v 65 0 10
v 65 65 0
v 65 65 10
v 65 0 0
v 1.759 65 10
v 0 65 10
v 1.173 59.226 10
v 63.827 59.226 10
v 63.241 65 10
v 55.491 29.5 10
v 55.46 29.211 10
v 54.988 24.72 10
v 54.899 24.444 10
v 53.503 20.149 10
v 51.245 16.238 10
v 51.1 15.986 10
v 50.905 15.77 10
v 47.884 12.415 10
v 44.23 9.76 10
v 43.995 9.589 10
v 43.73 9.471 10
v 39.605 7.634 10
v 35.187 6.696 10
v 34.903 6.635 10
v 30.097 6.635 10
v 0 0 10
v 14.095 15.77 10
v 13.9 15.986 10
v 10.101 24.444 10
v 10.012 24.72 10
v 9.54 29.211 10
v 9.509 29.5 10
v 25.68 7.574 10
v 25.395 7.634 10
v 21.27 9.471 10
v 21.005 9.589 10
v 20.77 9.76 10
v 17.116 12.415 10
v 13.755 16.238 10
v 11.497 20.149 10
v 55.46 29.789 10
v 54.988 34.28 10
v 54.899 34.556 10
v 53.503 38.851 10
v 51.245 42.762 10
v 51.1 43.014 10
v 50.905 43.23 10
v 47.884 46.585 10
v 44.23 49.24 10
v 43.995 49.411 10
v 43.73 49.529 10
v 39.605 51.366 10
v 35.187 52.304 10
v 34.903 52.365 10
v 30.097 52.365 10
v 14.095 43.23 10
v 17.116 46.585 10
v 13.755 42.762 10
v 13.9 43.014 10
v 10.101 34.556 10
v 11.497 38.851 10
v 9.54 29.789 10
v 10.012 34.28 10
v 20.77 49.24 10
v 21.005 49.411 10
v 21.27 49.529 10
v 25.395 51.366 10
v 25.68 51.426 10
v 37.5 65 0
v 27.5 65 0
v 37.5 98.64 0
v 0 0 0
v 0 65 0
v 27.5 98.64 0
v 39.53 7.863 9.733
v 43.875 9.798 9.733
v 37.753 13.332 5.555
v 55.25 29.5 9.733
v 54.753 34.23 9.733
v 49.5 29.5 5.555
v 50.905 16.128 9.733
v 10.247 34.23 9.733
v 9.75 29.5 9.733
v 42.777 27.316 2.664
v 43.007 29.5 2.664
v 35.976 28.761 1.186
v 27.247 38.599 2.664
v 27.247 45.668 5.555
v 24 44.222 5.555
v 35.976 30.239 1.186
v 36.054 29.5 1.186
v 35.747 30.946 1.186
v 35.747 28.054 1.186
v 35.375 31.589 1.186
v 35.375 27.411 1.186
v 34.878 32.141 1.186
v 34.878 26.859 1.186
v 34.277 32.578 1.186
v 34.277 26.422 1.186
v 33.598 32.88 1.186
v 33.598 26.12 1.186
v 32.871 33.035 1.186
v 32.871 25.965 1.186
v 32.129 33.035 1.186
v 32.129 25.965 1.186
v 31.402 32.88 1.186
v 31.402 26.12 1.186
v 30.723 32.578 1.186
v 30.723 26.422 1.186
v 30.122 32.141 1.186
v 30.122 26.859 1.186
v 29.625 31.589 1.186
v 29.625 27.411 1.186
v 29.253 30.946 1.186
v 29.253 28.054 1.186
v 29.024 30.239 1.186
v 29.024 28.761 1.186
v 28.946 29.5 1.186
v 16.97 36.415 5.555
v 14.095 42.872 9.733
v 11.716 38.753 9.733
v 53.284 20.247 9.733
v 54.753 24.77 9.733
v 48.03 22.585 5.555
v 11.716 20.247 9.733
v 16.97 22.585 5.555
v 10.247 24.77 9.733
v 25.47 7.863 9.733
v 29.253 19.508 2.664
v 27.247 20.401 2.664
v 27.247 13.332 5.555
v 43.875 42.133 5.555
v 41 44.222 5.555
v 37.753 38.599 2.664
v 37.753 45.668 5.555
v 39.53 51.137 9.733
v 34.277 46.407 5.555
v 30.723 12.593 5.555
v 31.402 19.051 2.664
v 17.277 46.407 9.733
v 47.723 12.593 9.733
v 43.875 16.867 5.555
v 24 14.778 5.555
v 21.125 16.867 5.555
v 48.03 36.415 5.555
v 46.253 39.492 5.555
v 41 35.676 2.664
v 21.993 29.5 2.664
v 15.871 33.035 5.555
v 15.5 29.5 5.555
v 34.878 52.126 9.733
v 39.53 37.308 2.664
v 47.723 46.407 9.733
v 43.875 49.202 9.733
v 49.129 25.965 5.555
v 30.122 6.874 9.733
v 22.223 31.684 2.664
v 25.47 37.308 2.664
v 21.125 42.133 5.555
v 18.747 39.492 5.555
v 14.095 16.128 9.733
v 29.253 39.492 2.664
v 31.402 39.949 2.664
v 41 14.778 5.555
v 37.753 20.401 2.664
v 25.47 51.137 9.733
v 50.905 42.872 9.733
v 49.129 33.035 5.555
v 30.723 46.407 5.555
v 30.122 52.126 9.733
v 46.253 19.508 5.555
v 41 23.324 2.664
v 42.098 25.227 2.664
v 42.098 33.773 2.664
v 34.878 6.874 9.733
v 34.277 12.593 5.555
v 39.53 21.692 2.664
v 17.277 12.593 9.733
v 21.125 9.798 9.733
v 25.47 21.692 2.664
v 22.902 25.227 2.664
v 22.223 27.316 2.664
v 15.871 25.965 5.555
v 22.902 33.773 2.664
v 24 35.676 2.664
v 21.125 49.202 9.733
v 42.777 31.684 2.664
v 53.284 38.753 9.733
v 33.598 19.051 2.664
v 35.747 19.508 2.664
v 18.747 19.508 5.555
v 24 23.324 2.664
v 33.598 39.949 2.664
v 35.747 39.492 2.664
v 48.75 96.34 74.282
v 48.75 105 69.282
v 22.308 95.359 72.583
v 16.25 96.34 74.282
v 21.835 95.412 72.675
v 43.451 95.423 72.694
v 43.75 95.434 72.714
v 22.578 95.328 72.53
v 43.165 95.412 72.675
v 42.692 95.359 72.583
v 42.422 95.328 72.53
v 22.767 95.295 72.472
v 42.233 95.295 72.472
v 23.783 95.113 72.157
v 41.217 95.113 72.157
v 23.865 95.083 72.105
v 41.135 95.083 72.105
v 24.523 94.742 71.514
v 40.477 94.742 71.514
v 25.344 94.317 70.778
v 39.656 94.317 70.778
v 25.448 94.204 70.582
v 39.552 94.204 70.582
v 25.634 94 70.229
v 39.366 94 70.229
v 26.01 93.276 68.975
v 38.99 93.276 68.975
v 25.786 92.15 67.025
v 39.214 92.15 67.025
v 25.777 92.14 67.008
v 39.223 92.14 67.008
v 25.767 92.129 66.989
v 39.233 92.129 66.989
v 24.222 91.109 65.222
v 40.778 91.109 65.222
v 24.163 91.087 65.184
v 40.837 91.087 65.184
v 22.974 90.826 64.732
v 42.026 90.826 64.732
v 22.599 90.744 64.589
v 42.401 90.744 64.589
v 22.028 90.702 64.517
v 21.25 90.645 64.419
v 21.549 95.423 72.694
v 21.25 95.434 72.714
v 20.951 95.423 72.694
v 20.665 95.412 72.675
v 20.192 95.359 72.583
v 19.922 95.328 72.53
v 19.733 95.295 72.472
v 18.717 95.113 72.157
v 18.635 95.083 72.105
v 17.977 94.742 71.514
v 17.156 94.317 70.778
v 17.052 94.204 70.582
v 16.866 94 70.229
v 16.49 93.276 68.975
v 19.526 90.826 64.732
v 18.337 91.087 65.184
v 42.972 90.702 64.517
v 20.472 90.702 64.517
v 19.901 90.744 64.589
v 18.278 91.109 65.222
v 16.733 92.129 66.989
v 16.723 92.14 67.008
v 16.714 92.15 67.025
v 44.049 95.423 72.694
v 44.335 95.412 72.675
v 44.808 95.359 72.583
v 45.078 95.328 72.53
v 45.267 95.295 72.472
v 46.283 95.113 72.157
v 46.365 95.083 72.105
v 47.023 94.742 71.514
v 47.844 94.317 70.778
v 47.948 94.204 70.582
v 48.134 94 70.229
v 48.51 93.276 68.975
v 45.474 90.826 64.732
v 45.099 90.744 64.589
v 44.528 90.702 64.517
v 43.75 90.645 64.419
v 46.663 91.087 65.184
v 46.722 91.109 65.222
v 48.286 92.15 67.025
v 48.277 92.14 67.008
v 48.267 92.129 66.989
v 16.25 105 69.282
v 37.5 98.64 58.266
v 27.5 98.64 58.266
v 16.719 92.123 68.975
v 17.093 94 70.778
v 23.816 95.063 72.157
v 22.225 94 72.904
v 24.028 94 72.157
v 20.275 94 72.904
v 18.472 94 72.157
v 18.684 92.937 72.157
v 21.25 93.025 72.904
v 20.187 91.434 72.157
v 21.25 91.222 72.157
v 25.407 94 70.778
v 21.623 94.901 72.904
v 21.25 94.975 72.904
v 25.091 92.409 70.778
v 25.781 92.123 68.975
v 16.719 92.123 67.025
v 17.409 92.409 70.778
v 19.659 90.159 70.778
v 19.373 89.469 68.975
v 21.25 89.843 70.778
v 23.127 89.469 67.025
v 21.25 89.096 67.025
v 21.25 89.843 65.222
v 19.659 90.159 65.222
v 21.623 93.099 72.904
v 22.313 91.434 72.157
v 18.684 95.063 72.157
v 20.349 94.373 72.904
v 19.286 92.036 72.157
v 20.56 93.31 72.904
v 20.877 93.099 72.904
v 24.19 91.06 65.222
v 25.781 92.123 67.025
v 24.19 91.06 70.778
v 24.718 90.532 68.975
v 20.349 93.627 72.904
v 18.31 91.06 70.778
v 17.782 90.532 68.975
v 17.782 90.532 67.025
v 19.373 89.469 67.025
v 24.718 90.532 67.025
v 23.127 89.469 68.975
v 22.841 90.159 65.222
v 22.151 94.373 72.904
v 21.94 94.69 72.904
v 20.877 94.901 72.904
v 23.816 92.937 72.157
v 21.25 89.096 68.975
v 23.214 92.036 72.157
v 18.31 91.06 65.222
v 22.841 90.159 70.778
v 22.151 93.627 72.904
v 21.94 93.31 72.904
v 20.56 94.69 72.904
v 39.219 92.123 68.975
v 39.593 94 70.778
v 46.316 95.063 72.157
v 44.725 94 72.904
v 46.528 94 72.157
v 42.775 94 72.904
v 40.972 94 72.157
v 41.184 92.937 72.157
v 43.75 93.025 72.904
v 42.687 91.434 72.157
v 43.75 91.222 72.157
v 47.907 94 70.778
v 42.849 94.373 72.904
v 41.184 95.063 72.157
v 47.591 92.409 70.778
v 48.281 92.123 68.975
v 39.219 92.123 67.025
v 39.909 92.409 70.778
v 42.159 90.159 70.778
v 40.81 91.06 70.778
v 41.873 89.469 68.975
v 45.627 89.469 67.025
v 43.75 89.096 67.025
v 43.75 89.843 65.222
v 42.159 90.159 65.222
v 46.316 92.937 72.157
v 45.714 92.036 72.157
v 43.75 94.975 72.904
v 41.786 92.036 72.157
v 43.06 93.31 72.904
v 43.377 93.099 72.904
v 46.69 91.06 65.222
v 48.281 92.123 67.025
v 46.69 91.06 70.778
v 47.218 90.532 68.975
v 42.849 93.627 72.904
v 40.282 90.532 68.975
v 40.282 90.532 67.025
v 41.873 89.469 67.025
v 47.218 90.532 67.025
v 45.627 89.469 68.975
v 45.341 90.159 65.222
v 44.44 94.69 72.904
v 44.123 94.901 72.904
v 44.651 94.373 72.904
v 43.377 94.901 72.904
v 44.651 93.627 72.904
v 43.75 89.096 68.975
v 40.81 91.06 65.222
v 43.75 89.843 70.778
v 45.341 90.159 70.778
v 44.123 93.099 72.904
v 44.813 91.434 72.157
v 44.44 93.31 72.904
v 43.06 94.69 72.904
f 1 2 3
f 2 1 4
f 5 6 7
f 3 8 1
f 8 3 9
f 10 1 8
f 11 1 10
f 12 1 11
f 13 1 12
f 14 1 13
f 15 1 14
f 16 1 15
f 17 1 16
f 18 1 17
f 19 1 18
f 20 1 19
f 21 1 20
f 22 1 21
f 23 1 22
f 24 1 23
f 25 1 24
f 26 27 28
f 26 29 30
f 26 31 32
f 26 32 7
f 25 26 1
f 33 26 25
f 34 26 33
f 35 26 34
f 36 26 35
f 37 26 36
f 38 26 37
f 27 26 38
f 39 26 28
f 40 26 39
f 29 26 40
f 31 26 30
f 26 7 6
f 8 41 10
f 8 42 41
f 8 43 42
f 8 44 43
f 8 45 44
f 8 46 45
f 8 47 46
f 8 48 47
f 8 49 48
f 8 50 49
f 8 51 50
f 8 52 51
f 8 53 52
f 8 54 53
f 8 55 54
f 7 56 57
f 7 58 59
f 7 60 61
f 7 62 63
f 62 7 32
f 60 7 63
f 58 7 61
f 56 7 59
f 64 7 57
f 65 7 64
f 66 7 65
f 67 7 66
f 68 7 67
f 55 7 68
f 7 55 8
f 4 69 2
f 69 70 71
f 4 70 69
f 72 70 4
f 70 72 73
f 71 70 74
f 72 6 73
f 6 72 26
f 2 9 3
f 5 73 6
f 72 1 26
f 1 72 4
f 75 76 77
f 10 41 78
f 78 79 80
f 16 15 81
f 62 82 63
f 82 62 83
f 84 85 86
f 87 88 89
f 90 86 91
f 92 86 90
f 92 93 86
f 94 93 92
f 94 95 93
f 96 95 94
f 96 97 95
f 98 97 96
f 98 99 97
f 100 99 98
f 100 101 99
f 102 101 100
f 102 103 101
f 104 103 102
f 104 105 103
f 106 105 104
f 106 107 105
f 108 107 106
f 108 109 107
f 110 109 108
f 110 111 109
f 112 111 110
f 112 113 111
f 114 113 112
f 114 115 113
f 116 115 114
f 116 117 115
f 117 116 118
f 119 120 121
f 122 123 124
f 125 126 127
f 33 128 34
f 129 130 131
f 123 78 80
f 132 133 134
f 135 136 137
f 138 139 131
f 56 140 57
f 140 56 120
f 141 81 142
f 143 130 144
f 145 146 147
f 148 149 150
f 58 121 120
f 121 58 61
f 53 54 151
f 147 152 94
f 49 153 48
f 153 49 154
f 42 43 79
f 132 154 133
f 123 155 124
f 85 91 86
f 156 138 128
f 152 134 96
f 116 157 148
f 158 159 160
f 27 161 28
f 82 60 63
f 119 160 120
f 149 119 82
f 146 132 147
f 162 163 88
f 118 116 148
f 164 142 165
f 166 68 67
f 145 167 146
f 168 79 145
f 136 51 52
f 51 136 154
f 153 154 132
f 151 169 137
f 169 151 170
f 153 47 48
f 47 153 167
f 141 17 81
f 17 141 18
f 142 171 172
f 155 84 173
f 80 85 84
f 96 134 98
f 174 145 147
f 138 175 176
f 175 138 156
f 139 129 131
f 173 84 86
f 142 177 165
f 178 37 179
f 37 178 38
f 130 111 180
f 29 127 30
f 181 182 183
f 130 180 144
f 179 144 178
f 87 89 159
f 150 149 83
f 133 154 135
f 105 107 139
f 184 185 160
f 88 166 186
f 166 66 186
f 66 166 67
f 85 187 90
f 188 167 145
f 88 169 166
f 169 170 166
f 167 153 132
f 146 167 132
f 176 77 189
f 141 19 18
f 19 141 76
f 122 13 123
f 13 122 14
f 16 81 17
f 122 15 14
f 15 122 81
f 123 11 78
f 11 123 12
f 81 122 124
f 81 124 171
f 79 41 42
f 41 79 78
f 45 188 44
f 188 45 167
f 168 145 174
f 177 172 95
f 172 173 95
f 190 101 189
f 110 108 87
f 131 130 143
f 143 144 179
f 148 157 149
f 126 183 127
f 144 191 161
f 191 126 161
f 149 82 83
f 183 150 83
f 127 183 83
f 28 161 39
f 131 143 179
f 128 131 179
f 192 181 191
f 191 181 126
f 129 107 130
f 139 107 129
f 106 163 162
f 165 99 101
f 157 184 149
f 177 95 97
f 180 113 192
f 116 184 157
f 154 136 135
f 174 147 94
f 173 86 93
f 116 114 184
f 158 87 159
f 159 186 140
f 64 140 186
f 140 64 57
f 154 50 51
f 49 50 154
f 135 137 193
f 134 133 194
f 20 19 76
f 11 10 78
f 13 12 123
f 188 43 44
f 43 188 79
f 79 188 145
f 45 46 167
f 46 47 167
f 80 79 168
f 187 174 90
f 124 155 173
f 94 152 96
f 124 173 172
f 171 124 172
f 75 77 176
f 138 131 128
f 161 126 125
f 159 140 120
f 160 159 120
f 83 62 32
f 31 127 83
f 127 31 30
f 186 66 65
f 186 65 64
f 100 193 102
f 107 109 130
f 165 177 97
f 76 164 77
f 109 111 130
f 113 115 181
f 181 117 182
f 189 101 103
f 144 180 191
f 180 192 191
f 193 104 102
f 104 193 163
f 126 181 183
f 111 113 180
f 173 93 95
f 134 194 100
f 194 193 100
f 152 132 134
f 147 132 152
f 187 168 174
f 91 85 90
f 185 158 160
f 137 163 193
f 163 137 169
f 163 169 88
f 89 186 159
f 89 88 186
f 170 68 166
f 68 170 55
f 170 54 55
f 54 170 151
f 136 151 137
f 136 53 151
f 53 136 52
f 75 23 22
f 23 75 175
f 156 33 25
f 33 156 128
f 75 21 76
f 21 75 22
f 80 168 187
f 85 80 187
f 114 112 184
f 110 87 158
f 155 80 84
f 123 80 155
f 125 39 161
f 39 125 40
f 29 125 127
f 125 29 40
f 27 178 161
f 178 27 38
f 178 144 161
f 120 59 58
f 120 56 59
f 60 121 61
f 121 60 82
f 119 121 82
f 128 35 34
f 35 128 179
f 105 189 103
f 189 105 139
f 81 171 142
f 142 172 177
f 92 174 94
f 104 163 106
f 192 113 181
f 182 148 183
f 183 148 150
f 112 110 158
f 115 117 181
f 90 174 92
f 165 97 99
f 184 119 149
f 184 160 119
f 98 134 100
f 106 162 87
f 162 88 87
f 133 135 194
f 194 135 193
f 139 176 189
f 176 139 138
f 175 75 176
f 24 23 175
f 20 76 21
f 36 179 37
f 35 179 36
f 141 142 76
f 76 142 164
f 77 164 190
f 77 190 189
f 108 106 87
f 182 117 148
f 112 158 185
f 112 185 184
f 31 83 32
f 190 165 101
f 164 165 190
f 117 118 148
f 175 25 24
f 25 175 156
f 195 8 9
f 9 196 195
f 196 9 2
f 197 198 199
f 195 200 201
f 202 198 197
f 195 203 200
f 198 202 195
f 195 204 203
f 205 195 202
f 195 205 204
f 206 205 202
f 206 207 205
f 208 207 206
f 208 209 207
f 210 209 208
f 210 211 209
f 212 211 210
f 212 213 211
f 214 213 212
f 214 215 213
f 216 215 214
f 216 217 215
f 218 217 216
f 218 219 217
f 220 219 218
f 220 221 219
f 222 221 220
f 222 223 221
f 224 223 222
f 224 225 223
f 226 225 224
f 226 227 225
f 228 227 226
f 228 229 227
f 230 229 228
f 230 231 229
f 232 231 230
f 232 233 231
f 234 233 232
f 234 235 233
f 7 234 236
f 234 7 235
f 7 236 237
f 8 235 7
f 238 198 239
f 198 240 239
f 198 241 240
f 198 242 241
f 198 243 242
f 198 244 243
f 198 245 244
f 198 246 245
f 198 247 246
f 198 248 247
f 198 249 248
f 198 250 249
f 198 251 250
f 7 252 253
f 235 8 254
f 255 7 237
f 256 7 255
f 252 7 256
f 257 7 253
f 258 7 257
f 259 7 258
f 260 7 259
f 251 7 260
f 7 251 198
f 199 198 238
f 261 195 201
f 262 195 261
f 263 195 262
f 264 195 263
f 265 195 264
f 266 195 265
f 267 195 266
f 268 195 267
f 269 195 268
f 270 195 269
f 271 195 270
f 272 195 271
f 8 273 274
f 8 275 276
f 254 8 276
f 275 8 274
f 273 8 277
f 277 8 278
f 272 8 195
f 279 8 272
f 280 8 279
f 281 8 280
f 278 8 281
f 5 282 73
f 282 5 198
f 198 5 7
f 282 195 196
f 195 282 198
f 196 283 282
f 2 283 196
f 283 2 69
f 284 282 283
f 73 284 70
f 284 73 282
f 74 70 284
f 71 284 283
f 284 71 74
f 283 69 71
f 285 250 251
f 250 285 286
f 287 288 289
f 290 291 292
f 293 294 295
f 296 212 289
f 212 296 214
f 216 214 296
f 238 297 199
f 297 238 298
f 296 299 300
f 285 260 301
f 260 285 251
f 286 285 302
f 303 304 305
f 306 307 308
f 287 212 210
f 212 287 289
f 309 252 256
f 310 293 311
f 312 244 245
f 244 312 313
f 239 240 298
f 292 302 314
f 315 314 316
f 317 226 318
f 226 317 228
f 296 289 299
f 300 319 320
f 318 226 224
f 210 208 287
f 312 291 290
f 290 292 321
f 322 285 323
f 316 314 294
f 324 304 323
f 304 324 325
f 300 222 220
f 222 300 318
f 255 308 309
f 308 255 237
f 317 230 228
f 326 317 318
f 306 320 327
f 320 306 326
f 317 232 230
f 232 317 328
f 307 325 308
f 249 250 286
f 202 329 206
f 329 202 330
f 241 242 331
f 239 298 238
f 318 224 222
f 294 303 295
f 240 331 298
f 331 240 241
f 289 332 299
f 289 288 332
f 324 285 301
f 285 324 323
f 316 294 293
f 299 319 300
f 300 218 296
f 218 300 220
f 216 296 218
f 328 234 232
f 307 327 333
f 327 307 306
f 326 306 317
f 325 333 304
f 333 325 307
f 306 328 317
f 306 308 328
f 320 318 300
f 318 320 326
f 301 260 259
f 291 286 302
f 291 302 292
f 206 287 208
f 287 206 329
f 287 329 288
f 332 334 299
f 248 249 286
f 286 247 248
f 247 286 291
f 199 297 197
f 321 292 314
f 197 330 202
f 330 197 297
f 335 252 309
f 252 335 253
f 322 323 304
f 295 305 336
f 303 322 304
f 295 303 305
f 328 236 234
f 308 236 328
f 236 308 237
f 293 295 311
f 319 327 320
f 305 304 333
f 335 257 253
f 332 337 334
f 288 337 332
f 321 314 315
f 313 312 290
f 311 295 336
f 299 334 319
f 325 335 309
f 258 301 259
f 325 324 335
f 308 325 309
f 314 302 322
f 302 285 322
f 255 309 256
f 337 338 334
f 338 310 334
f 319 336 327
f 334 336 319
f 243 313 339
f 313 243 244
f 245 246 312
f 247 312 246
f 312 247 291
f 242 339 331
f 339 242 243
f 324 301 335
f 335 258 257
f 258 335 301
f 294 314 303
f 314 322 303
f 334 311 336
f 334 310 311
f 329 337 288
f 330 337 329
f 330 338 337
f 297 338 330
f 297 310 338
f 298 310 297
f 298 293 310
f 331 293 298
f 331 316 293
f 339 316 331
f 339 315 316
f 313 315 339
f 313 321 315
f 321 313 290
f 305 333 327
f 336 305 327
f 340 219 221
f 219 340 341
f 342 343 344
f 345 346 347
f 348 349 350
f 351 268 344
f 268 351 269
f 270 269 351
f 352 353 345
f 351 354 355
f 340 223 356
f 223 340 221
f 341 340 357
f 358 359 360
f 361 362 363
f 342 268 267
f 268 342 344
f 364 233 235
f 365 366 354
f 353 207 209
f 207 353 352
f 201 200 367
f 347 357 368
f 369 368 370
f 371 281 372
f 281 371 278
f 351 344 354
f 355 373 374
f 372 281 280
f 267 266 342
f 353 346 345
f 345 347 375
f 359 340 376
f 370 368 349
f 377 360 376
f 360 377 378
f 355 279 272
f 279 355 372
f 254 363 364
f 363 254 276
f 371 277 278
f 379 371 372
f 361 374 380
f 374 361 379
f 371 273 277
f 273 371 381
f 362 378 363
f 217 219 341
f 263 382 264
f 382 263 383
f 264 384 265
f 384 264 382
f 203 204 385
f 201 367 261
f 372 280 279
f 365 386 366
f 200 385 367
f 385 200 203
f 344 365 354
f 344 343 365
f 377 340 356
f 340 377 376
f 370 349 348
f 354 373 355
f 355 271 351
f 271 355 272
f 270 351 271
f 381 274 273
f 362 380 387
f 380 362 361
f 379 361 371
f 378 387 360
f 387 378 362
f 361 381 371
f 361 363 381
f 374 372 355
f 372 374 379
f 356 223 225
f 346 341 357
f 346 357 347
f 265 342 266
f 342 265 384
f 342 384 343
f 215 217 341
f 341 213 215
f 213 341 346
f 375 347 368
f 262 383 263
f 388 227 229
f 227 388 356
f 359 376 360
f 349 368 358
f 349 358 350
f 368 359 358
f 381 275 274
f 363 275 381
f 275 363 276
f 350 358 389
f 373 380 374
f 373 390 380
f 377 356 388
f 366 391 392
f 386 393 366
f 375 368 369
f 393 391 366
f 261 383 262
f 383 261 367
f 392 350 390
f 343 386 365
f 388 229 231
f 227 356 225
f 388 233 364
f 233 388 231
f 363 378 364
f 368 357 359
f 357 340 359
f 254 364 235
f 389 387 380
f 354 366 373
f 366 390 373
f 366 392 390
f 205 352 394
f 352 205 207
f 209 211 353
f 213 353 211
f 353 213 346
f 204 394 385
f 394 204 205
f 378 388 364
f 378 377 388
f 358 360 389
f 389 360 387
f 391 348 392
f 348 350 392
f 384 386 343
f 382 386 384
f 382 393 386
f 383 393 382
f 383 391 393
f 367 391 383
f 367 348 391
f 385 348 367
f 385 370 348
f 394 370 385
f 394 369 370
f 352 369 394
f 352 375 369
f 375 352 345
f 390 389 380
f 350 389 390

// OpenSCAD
thickness=10;
w=65;
h=80;
cyl_d=68;

difference() {
  cube([w,w,thickness]);
  translate([w/2, w/2-3, cyl_d/2+1]) sphere(d=cyl_d);
}

translate([0,w,0])
rotate([60,0,0])
linear_extrude(height=thickness)
polygon([
  [0,0],
  [w/4,h],
  [3*w/4,h],
  [w,0]
]);

translate([w/2-thickness/2,w-1,0])
rotate([90,0,90])
linear_extrude(height=thickness)
polygon([
  [0,0],
  [34.64,0],
  [34.64,60]
]);

translate([w/4+5,94,68])
sphere(d=10);

translate([3*w/4-5,94,68])
sphere(d=10);
